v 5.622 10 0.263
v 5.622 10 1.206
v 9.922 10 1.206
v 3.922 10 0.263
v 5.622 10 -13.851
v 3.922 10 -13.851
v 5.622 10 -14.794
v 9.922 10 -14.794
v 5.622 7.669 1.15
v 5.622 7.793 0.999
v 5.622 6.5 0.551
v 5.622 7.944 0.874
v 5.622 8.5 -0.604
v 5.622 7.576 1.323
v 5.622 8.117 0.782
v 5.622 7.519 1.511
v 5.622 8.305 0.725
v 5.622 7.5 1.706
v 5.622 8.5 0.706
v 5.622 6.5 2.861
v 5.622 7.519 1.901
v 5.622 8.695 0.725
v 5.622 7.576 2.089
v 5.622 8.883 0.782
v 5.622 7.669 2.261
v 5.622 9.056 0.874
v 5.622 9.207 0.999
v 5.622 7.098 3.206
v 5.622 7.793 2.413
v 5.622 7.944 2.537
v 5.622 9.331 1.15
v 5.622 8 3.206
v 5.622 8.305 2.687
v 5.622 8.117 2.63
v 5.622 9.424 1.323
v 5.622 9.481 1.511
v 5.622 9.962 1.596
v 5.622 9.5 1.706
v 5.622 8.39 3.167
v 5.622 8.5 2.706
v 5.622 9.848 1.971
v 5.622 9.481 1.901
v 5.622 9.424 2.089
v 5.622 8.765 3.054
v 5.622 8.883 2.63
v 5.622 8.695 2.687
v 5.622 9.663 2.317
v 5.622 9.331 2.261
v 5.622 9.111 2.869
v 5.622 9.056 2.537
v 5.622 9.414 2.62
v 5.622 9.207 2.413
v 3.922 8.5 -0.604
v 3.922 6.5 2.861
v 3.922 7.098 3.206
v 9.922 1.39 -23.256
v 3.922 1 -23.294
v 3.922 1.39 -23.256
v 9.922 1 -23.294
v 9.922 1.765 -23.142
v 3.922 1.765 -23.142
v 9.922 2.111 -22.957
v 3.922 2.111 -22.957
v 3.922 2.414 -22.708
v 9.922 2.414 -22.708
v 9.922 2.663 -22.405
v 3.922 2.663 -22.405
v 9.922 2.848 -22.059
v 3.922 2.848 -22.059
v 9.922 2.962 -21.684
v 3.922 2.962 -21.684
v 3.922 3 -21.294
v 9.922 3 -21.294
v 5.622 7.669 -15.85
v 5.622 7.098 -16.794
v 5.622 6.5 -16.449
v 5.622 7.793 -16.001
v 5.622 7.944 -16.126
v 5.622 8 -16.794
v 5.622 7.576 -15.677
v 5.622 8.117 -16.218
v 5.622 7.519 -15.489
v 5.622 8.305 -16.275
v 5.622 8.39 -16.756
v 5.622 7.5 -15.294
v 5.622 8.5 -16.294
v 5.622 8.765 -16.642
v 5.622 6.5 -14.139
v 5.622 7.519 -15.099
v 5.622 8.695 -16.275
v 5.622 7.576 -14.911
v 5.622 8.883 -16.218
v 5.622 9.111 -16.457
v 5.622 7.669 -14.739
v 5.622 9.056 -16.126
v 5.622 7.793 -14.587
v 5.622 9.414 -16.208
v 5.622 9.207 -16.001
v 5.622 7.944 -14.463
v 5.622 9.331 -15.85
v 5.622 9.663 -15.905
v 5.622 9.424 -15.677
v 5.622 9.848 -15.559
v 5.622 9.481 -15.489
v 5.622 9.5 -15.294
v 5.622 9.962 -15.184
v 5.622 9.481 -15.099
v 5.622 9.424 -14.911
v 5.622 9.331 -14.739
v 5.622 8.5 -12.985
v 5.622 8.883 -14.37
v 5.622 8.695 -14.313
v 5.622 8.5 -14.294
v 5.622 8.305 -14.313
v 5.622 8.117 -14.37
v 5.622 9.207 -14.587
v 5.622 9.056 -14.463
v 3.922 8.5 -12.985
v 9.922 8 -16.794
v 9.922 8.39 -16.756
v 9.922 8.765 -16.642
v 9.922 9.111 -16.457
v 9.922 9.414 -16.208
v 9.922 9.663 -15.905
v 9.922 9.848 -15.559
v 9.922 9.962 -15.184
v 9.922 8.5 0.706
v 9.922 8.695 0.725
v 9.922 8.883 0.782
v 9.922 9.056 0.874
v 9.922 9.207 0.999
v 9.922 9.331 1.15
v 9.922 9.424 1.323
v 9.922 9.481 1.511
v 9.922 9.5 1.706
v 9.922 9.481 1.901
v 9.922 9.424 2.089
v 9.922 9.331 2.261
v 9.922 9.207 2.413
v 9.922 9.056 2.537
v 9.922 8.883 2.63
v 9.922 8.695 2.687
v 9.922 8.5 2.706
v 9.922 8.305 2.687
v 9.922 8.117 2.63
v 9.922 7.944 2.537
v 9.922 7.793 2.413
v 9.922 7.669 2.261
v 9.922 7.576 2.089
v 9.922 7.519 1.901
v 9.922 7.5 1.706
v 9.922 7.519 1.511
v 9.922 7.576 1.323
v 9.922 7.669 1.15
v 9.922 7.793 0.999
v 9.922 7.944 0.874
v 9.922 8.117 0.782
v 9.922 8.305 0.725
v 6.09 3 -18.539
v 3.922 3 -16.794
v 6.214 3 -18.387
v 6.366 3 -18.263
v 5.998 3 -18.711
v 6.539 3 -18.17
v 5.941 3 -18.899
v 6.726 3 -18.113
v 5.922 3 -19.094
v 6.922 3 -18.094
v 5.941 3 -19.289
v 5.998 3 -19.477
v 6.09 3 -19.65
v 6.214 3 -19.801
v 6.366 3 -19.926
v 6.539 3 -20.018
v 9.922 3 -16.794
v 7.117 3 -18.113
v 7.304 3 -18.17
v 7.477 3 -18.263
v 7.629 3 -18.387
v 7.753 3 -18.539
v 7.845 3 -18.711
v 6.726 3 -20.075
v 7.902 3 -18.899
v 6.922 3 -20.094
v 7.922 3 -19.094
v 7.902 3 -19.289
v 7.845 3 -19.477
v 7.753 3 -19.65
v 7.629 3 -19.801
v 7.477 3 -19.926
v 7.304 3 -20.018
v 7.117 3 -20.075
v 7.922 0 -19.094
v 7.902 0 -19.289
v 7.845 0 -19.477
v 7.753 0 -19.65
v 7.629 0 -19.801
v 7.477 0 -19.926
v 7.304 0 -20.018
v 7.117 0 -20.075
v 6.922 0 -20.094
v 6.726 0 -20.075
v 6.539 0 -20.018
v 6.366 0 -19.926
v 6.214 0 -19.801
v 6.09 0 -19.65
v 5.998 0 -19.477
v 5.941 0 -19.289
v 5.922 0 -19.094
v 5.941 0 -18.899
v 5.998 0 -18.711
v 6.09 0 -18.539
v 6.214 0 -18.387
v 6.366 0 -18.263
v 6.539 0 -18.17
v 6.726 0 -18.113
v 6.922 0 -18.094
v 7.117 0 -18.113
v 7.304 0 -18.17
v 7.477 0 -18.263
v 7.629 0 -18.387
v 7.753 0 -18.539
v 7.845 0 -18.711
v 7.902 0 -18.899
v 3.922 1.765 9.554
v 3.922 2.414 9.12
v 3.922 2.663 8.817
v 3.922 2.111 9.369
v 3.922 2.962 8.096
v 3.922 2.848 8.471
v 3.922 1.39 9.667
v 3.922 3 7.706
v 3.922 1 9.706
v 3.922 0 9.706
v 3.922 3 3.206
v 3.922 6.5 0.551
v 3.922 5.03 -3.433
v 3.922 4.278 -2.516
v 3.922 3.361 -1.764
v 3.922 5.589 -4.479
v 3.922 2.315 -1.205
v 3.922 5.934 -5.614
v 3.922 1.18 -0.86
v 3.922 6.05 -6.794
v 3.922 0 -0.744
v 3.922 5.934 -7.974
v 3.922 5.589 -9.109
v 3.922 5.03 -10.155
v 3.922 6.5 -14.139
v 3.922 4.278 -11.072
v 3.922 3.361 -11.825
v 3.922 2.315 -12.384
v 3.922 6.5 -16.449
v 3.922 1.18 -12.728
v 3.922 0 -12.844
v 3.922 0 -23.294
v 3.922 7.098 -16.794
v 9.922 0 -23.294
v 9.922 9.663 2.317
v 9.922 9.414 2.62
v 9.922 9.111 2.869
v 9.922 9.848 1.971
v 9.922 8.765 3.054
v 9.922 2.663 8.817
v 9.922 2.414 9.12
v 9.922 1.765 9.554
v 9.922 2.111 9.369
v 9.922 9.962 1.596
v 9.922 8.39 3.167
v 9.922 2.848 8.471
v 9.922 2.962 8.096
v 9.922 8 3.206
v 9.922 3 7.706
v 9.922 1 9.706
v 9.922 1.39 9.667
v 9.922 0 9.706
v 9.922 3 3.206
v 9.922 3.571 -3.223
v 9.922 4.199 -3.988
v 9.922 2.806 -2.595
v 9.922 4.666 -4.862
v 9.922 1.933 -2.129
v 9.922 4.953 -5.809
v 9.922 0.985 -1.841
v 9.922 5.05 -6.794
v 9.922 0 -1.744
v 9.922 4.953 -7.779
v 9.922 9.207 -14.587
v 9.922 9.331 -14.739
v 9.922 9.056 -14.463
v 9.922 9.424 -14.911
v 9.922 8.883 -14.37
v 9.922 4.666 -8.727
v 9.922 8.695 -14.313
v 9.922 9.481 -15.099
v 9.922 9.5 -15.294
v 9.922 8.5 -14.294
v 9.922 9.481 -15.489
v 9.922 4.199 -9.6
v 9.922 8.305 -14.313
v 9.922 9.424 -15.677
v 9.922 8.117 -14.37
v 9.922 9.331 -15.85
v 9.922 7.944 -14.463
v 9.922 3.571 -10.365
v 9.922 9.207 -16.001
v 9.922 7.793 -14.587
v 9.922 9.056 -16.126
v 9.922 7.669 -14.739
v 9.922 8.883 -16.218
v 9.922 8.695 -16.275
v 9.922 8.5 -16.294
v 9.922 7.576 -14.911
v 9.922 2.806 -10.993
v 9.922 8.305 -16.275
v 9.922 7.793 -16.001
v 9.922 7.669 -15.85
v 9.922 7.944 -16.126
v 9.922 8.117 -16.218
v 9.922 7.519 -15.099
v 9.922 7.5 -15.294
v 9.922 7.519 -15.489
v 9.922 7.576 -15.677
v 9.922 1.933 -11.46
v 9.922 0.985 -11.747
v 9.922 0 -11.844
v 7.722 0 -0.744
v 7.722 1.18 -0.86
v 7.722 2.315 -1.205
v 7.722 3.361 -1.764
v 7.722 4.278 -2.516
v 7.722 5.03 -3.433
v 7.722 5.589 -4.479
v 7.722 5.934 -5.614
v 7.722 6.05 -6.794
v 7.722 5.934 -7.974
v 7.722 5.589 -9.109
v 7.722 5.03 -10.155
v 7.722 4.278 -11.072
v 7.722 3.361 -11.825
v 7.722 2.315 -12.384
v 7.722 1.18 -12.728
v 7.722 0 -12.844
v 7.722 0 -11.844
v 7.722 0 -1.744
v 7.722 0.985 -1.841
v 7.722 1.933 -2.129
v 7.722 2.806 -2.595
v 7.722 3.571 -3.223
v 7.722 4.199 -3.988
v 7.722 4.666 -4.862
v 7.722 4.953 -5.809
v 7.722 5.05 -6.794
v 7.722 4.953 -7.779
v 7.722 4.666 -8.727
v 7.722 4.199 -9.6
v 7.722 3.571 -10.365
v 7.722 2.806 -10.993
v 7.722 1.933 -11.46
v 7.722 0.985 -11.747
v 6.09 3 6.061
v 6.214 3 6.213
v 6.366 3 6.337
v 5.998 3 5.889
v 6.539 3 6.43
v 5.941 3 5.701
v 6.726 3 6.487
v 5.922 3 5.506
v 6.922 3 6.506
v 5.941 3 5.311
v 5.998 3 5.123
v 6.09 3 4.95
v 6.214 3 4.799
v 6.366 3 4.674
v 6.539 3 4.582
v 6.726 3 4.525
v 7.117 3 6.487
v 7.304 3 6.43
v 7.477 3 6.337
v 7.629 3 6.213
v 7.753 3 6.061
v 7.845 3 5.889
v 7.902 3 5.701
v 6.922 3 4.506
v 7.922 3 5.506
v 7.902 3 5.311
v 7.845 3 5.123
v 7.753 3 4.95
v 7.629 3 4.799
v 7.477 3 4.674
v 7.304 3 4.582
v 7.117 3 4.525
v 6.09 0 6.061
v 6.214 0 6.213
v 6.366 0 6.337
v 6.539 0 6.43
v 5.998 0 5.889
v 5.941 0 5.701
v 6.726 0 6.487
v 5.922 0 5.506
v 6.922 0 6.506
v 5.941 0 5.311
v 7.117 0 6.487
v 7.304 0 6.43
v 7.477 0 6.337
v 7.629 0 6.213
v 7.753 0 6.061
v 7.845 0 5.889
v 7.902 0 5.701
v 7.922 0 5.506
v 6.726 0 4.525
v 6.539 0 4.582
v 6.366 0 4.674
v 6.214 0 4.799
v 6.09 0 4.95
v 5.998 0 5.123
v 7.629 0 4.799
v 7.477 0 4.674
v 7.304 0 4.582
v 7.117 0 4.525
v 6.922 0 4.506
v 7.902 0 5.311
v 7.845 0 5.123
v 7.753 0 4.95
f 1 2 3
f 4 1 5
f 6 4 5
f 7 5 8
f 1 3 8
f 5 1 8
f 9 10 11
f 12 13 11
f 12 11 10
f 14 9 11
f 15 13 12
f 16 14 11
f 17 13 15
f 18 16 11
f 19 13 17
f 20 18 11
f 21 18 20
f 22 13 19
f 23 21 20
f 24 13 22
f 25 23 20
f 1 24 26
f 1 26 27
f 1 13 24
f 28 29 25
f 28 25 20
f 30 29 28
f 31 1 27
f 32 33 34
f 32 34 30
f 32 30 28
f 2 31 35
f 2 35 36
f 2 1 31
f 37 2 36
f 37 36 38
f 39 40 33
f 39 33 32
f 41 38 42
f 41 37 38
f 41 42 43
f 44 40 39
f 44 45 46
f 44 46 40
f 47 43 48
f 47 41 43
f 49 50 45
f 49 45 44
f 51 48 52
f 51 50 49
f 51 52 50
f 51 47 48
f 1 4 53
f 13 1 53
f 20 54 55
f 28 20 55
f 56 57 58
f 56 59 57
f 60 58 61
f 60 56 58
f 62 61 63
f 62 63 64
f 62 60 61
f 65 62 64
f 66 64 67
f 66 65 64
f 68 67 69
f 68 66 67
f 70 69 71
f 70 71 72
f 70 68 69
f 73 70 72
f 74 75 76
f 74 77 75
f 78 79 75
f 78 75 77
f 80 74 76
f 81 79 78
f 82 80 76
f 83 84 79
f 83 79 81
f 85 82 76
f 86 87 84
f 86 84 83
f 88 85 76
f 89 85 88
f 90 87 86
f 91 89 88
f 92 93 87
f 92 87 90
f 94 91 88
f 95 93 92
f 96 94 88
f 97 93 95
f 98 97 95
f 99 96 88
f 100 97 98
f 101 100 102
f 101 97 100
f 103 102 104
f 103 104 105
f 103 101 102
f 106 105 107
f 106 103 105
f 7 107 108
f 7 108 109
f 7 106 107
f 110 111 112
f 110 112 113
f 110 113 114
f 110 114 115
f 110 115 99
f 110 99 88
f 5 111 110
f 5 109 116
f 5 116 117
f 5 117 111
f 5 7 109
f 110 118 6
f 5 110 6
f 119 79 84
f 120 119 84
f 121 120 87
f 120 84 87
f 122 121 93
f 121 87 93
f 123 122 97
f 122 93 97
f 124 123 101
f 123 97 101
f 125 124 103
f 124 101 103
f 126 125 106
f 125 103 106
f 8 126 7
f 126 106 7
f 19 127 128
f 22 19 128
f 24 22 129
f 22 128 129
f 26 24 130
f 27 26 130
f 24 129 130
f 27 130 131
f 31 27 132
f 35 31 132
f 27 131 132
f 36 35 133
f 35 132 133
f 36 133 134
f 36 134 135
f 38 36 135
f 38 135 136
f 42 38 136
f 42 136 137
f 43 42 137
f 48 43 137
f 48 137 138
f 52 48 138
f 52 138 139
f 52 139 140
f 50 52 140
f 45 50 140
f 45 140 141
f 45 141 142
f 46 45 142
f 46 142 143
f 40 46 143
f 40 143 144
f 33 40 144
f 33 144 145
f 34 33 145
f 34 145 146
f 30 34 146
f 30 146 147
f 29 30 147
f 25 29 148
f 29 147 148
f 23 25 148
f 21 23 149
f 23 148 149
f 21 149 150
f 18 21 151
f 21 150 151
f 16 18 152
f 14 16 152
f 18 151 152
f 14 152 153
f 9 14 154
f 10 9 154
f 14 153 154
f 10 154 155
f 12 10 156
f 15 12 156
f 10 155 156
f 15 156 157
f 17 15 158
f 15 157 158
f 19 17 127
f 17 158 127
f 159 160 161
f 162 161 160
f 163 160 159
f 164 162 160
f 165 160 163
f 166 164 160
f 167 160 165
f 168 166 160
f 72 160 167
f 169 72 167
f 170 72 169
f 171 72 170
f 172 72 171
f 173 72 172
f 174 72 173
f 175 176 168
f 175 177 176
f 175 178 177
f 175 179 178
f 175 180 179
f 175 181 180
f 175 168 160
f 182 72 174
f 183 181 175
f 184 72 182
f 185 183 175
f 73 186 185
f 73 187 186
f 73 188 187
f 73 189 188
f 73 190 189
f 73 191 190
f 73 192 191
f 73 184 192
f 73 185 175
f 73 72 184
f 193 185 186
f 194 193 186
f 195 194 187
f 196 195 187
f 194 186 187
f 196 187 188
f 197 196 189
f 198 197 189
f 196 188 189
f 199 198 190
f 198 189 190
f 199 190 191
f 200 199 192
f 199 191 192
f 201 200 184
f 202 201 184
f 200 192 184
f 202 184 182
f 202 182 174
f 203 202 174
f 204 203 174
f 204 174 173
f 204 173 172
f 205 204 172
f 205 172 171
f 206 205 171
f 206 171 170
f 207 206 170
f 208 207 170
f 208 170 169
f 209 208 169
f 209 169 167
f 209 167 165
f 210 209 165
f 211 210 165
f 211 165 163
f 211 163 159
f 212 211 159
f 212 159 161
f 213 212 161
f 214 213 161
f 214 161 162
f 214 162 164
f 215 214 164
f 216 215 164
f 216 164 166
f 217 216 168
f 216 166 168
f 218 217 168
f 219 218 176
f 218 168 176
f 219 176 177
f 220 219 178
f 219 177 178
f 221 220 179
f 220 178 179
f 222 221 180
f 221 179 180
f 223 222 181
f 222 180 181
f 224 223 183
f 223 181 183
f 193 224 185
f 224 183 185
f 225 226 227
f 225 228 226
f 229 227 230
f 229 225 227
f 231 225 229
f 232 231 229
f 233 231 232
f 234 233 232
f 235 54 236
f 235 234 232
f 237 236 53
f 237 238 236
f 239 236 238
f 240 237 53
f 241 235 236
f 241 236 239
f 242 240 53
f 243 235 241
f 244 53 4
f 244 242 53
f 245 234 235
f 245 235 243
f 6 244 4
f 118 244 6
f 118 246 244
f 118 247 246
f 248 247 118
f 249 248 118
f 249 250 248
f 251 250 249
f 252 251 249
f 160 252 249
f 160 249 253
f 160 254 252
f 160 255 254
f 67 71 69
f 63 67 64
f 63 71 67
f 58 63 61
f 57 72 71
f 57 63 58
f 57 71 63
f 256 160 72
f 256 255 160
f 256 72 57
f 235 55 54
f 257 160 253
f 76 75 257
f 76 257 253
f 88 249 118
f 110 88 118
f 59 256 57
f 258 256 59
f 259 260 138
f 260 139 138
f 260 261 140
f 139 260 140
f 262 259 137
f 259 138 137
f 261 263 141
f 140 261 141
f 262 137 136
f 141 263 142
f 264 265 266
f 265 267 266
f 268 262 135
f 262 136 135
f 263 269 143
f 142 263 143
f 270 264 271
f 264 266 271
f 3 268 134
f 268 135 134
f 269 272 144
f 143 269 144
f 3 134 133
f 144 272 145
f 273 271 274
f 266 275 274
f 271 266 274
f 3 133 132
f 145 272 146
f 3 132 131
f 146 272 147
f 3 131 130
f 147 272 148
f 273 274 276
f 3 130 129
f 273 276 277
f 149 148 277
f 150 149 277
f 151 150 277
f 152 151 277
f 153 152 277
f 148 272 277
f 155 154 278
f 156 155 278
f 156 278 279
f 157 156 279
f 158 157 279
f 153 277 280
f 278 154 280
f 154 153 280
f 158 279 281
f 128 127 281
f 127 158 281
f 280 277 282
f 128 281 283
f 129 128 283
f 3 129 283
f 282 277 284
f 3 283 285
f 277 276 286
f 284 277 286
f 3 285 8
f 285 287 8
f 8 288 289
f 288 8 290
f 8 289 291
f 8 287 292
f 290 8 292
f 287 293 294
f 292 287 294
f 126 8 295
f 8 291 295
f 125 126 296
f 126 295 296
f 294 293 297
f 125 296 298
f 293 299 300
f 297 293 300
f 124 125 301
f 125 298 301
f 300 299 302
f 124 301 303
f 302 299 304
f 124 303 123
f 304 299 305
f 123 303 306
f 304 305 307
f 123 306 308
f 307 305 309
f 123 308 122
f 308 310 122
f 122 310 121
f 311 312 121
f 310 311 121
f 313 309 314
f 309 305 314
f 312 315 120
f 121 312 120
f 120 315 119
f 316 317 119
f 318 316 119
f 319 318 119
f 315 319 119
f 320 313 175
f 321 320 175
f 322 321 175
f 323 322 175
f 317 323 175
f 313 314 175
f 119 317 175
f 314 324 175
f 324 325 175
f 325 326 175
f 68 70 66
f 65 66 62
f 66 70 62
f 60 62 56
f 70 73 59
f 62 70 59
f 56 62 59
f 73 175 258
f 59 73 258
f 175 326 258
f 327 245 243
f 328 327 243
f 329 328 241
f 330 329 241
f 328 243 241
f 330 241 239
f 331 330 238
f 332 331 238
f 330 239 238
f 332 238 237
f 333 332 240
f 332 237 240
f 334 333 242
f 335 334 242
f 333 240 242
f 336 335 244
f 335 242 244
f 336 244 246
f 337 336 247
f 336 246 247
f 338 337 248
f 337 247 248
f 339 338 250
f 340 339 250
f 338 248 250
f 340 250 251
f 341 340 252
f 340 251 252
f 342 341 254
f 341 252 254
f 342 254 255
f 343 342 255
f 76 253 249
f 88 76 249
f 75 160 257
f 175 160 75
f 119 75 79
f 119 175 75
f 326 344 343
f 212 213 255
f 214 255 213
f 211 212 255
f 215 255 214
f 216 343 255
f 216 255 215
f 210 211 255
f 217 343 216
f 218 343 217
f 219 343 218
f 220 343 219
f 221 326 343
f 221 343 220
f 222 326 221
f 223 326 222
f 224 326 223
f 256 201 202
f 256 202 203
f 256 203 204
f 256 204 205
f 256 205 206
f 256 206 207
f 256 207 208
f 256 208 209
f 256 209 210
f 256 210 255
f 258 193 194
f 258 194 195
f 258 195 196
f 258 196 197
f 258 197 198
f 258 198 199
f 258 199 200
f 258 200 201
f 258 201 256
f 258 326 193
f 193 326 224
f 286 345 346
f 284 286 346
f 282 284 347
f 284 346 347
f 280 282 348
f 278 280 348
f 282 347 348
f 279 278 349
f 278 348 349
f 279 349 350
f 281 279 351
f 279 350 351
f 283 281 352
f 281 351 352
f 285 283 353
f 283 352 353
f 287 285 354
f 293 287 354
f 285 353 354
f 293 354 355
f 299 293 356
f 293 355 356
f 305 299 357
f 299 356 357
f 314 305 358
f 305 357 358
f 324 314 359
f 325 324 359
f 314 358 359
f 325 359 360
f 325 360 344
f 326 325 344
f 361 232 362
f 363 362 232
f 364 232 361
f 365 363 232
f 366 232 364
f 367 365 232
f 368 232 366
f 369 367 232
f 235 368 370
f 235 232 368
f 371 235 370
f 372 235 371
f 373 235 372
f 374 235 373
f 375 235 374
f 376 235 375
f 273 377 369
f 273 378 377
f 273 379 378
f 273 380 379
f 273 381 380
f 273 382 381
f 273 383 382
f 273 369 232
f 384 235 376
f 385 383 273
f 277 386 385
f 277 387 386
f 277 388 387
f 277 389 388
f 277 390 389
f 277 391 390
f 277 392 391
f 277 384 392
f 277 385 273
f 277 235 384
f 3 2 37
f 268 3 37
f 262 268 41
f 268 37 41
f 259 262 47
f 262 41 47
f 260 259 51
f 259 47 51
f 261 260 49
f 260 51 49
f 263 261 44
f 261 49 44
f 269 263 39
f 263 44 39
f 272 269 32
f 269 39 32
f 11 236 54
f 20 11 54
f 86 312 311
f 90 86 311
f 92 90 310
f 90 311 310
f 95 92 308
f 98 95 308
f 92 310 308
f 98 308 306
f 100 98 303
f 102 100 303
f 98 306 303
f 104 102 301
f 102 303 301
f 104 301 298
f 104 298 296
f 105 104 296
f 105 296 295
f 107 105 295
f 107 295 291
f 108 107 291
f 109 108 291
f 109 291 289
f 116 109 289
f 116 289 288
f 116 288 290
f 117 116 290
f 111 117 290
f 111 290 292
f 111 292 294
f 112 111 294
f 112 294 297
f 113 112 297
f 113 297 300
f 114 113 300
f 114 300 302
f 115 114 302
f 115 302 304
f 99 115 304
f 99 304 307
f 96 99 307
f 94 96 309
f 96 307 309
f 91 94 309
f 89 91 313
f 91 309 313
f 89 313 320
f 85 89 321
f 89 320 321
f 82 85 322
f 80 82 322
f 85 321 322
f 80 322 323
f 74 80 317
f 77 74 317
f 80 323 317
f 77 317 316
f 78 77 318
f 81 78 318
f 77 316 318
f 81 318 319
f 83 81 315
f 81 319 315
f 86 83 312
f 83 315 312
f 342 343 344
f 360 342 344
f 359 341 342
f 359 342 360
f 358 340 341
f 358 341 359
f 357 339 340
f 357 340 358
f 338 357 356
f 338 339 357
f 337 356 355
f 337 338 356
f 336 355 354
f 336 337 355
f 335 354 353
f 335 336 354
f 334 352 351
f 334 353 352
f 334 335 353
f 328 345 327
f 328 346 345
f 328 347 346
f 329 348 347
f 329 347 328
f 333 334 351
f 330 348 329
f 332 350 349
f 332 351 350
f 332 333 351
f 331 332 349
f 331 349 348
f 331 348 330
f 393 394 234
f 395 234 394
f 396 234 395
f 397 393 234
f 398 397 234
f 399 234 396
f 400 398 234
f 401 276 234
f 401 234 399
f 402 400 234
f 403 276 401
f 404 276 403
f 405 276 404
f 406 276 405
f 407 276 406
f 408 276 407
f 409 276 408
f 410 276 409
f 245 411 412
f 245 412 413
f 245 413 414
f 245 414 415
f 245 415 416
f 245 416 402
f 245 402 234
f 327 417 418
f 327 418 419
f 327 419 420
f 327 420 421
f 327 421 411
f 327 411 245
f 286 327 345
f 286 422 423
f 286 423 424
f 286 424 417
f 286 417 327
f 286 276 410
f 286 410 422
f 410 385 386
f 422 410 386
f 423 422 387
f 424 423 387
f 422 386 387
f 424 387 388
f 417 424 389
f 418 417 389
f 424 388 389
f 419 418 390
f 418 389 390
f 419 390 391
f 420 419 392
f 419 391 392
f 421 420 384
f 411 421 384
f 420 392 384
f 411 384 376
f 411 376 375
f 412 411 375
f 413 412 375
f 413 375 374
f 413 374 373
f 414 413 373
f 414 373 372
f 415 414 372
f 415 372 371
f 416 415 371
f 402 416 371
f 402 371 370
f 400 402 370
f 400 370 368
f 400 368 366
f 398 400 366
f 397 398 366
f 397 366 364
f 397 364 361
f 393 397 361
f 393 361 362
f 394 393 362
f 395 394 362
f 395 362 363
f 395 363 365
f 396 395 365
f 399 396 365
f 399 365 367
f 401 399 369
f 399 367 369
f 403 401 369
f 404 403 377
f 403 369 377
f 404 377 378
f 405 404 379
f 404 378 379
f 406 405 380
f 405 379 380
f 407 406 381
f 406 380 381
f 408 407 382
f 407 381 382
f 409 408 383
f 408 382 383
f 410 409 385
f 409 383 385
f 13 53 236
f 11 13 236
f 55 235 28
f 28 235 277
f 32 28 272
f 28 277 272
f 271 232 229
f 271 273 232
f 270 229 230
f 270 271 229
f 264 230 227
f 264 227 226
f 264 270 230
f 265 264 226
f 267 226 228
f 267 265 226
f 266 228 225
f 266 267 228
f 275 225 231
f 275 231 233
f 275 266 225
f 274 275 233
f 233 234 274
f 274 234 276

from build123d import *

# Parameters (mm, degrees)
SKETCH1_W           = 6
SKETCH1_H           = 33
BOSS_EXTRUDE1_DEPTH = 3
SKETCH3_W           = 20
SKETCH3_H           = 10
BOSS_EXTRUDE2_DEPTH = 6
FILLET1_R           = 2
CUT_EXTRUDE1_DEPTH  = 43
SKETCH5_R           = 6.05
CUT_EXTRUDE2_DEPTH  = 3.8
FILLET2_R           = 2
SKETCH6_R           = 1
CUT_EXTRUDE3_DEPTH  = 3.8
SKETCH7_R           = 1
CUT_EXTRUDE4_DEPTH  = 15
CUT_EXTRUDE5_DEPTH  = 1.7


with BuildPart() as part:
    # Sketch1 → Boss-Extrude1 (new body)
    with BuildSketch(Plane(origin=(0, 0, 0), x_dir=(1, 0, 0), z_dir=(0, 1, 0))):
        with Locations((6.921568627, 6.794117647)):
            Rectangle(SKETCH1_W, SKETCH1_H)
    extrude(amount=BOSS_EXTRUDE1_DEPTH)

    # Sketch3 → Boss-Extrude2 (add)
    with BuildSketch(Plane(origin=(9.921568627, 0, 0), x_dir=(0, 0, -1), z_dir=(1, 0, 0))):
        with Locations((6.794117647, 5)):
            Rectangle(SKETCH3_W, SKETCH3_H)
    extrude(amount=-BOSS_EXTRUDE2_DEPTH)

    # Fillet1
    fillet1_edges = [part.edges().sort_by_distance(p)[0] for p in [
        (6.921568627, 10, 3.205882353),
        (6.921568627, 10, -16.794117647),
    ]]
    fillet(fillet1_edges, radius=FILLET1_R)

    # Sketch4 → Cut-Extrude1 (cut)
    with BuildSketch(Plane.ZY.offset(-3.921568627)):
        with BuildLine():
            Line((-11.844117647, 0), (-1.744117647, 0))
            ThreePointArc((-1.744117647, 0), (-6.794117647, 5.05), (-11.844117647, 0))
        make_face()
    extrude(amount=-CUT_EXTRUDE1_DEPTH, mode=Mode.SUBTRACT)

    # Sketch5 → Cut-Extrude2 (cut)
    with BuildSketch(Plane.ZY.offset(-3.921568627)):
        with Locations((-6.794117647, 0)):
            Circle(SKETCH5_R)
    extrude(amount=-CUT_EXTRUDE2_DEPTH, mode=Mode.SUBTRACT)

    # Fillet2
    fillet2_edges = [part.edges().sort_by_distance(p)[0] for p in [
        (6.921568627, 3, -23.294117647),
        (6.921568627, 3, 9.705882353),
    ]]
    fillet(fillet2_edges, radius=FILLET2_R)

    # Sketch6 → Cut-Extrude3 (cut)
    with BuildSketch(Plane(origin=(0, 3, 0), x_dir=(1, 0, 0), z_dir=(0, 1, 0))):
        with Locations((6.921568627, -5.505882353)):
            Circle(SKETCH6_R)
        with Locations((6.921568627, 19.094117647)):
            Circle(SKETCH6_R)
    extrude(amount=-CUT_EXTRUDE3_DEPTH, mode=Mode.SUBTRACT)

    # Sketch7 → Cut-Extrude4 (cut)
    with BuildSketch(Plane(origin=(9.921568627, 0, 0), x_dir=(0, 0, -1), z_dir=(1, 0, 0))):
        with Locations((-1.705882353, 8.5)):
            Circle(SKETCH7_R)
        with Locations((15.294117647, 8.5)):
            Circle(SKETCH7_R)
    extrude(amount=-CUT_EXTRUDE4_DEPTH, mode=Mode.SUBTRACT)

    # Sketch8 → Cut-Extrude5 (cut)
    with BuildSketch(Plane.ZY.offset(-3.921568627)):
        Polygon((-0.603518724, 8.5), (0.551181815, 6.5), (2.860582891, 6.5), (4.01528343, 8.5), (2.860582891, 10.5), (0.551181815, 10.5), align=None)
        Polygon((-17.603518724, 8.5), (-16.448818185, 6.5), (-14.139417109, 6.5), (-12.98471657, 8.5), (-14.139417109, 10.5), (-16.448818185, 10.5), align=None)
    extrude(amount=-CUT_EXTRUDE5_DEPTH, mode=Mode.SUBTRACT)


solid = part.part
